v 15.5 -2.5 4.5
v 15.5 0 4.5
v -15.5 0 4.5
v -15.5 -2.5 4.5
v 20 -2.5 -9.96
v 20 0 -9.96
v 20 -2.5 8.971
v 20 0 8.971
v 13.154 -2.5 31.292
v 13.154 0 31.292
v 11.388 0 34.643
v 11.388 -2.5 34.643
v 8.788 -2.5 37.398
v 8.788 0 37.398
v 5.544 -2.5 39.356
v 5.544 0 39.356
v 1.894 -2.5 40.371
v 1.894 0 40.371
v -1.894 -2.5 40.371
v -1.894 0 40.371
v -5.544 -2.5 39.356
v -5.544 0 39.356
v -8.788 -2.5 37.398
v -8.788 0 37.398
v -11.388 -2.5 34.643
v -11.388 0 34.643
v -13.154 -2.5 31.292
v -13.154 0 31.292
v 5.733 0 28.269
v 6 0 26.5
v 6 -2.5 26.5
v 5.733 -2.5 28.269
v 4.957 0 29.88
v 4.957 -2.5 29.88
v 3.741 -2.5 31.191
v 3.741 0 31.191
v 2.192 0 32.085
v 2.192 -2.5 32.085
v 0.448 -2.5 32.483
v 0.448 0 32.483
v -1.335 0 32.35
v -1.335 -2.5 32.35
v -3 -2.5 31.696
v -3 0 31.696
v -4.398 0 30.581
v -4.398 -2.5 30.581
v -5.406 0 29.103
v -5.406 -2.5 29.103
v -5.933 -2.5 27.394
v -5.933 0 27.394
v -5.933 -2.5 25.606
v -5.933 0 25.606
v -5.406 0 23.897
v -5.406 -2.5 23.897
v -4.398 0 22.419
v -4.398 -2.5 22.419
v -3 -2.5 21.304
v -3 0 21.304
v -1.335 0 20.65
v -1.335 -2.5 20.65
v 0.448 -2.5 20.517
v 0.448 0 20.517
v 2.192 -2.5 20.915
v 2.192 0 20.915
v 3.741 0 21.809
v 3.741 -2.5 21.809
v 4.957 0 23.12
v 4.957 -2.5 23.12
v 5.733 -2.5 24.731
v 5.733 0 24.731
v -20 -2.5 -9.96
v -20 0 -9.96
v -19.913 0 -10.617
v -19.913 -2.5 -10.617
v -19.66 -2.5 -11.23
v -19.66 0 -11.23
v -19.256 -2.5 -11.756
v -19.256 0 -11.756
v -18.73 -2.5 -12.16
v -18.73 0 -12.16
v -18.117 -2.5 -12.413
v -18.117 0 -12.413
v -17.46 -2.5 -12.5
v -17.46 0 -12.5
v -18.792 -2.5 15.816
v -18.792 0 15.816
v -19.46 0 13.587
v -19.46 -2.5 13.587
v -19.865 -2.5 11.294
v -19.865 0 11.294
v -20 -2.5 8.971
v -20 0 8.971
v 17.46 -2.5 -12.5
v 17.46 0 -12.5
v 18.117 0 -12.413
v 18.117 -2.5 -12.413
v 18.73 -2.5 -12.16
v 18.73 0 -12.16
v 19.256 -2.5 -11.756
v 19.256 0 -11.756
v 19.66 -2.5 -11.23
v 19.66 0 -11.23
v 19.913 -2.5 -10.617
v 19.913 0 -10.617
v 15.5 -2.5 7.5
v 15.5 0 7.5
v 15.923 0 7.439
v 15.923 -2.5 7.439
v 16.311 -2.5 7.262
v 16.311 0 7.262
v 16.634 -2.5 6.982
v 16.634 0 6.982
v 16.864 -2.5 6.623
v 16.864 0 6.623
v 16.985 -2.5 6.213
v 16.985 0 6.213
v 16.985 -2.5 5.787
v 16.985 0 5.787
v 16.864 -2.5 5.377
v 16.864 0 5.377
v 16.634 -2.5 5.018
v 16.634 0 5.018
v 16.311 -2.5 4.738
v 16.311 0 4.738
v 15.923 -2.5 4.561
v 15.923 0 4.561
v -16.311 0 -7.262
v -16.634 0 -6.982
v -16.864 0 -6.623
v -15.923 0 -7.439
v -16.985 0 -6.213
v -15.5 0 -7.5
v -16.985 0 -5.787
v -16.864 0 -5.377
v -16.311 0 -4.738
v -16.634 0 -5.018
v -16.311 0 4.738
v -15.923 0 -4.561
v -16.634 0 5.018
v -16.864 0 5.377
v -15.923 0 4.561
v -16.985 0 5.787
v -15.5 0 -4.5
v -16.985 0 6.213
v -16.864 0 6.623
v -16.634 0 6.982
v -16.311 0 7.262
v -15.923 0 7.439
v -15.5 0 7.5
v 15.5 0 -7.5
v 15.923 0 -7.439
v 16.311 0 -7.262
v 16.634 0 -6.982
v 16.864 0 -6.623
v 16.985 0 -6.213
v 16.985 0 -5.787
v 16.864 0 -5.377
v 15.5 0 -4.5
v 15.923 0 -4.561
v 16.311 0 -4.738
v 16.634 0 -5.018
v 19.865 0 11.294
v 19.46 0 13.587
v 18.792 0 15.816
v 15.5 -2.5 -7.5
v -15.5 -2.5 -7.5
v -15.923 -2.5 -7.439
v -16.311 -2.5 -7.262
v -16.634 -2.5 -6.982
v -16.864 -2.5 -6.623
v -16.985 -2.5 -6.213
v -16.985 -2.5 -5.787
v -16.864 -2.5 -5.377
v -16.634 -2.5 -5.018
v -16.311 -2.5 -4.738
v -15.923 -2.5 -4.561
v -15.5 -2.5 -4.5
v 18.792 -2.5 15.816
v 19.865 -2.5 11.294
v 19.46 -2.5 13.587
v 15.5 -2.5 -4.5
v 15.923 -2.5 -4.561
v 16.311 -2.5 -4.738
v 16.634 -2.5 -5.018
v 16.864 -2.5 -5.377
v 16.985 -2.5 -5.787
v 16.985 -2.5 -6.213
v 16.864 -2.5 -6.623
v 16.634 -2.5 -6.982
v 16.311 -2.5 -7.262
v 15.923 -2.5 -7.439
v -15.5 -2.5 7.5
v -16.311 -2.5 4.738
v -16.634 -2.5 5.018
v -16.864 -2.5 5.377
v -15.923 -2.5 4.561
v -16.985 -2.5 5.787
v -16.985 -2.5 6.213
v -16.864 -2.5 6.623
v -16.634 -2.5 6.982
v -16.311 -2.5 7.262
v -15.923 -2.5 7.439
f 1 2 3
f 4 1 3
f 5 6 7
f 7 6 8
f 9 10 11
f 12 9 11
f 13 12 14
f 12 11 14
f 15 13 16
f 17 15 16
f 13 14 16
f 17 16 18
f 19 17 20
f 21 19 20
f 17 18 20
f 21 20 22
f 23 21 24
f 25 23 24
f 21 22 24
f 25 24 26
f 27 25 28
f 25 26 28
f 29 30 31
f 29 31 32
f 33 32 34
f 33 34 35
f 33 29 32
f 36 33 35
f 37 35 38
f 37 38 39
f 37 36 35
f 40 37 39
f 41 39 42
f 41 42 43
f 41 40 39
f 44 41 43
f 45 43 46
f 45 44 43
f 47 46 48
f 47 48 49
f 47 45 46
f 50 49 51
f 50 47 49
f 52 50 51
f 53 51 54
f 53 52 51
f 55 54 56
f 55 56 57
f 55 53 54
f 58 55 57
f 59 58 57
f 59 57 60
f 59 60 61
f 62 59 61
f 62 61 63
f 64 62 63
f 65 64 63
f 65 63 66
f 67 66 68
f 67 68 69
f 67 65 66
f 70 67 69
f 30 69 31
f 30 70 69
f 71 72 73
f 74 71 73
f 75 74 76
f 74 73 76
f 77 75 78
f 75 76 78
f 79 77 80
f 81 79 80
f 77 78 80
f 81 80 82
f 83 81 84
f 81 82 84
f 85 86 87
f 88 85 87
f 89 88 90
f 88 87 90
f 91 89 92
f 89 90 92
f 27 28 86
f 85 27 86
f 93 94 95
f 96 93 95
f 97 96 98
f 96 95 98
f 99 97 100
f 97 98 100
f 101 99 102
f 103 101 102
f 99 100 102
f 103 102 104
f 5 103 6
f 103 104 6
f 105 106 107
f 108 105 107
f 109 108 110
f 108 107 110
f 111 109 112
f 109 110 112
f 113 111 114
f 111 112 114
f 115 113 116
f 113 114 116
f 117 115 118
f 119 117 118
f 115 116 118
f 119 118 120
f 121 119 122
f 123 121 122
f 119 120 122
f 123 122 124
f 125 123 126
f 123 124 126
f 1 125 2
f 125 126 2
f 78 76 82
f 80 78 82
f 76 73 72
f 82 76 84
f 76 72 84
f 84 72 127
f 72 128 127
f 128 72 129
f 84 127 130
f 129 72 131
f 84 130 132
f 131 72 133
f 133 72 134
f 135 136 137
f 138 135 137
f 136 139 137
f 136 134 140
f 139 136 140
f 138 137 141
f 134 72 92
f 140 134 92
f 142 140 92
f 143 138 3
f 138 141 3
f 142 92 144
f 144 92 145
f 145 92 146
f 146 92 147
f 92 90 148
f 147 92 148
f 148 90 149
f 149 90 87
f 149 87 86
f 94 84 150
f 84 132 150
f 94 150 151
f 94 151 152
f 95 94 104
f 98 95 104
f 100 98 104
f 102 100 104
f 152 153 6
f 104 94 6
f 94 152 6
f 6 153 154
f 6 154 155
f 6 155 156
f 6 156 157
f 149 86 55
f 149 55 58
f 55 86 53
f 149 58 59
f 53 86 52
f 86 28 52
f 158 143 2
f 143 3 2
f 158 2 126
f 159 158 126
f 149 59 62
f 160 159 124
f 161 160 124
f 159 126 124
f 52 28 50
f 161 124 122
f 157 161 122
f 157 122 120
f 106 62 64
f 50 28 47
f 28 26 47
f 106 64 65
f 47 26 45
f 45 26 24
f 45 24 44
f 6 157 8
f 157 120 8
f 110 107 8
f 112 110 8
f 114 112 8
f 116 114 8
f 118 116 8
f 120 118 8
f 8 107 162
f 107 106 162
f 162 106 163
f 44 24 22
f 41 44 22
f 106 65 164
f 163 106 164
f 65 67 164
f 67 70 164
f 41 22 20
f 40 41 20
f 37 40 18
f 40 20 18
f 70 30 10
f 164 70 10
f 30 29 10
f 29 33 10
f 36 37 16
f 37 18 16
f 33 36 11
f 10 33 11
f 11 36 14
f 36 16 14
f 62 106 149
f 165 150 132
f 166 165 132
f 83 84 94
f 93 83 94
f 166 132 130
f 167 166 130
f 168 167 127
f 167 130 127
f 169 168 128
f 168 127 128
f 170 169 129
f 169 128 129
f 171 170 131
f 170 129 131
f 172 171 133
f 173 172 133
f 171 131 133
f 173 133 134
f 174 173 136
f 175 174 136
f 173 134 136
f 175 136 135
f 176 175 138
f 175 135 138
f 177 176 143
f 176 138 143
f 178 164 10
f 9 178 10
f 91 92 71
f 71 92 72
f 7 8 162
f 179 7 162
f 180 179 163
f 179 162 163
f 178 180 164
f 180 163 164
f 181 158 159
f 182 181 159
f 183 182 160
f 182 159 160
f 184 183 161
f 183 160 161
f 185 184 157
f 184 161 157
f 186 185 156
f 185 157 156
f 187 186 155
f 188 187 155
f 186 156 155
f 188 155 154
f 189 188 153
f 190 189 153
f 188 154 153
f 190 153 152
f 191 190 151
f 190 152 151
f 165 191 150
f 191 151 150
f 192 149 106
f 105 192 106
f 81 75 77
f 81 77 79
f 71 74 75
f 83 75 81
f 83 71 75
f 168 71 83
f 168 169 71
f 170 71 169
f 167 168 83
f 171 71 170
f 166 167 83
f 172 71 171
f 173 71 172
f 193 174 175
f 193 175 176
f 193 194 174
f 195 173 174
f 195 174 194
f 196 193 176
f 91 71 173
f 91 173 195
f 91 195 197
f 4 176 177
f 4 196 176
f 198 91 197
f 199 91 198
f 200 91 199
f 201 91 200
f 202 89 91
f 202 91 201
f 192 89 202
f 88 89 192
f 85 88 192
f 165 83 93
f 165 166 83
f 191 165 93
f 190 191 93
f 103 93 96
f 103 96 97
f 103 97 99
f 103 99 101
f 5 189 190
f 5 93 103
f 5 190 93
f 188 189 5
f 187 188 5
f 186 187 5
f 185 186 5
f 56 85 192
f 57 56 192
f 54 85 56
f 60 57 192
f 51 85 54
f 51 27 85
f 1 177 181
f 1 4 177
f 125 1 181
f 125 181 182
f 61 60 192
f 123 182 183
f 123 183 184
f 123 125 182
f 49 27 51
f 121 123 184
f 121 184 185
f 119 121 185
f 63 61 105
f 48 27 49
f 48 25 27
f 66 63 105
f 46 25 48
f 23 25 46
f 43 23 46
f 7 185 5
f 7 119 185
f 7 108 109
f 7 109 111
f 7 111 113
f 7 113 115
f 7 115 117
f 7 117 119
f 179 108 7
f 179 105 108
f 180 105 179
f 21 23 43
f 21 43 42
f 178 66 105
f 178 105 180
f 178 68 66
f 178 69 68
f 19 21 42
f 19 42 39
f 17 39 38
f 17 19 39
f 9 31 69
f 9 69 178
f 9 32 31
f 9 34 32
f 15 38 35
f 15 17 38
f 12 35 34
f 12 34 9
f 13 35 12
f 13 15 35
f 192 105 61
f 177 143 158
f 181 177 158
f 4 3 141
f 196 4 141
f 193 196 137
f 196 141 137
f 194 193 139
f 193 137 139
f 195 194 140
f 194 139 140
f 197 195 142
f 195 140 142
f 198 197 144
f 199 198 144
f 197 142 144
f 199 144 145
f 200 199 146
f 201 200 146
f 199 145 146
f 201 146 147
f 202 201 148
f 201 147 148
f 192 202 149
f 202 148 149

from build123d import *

# Parameters (mm, degrees)
F0_R     = 6
F1_DEPTH = 2.5
F2_DEPTH = 8
F3_R     = 1.54


with BuildPart() as f1:
    # F0 (on Front) → F1 (new body)
    with BuildSketch(Plane.XZ):
        with BuildLine():
            ThreePointArc((-20, -9.96), (-19.256051, -11.756051), (-17.46, -12.5))
            Line((-17.46, -12.5), (17.46, -12.5))
            ThreePointArc((17.46, -12.5), (19.256051, -11.756051), (20, -9.96))
            Line((20, -9.96), (20, 8.970588))
            ThreePointArc((20, 8.970588), (19.695671, 12.446295), (18.791946, 15.816226))
            Line((18.791946, 15.816226), (13.154362, 31.291946))
            ThreePointArc((13.154362, 31.291946), (0, 40.5), (-13.154362, 31.291946))
            Line((-13.154362, 31.291946), (-18.791946, 15.816226))
            ThreePointArc((-18.791946, 15.816226), (-19.695671, 12.446295), (-20, 8.970588))
            Line((-20, 8.970588), (-20, -9.96))
        make_face()
        with BuildLine():
            ThreePointArc((-15.5, -7.5), (-17, -6), (-15.5, -4.5))
            Line((-15.5, -4.5), (15.5, -4.5))
            ThreePointArc((15.5, -4.5), (17, -6), (15.5, -7.5))
            Line((15.5, -7.5), (-15.5, -7.5))
        make_face(mode=Mode.SUBTRACT)
        with BuildLine():
            Line((15.5, 4.5), (-15.5, 4.5))
            ThreePointArc((-15.5, 4.5), (-17, 6), (-15.5, 7.5))
            Line((-15.5, 7.5), (15.5, 7.5))
            ThreePointArc((15.5, 7.5), (17, 6), (15.5, 4.5))
        make_face(mode=Mode.SUBTRACT)
        with Locations((0, 26.5)):
            Circle(F0_R, mode=Mode.SUBTRACT)
    extrude(amount=F1_DEPTH)


with BuildPart() as f2:
    # F0 (on Front) → F2 (new body)
    with BuildSketch(Plane.XZ):
        with Locations((0, 26.5)):
            Circle(F0_R)
    extrude(amount=F2_DEPTH)

    # F3
    f3_edges = [f2.edges().sort_by_distance(p)[0] for p in [
        (-6, -8, 26.5),
    ]]
    fillet(f3_edges, radius=F3_R)


solid = f1.part
